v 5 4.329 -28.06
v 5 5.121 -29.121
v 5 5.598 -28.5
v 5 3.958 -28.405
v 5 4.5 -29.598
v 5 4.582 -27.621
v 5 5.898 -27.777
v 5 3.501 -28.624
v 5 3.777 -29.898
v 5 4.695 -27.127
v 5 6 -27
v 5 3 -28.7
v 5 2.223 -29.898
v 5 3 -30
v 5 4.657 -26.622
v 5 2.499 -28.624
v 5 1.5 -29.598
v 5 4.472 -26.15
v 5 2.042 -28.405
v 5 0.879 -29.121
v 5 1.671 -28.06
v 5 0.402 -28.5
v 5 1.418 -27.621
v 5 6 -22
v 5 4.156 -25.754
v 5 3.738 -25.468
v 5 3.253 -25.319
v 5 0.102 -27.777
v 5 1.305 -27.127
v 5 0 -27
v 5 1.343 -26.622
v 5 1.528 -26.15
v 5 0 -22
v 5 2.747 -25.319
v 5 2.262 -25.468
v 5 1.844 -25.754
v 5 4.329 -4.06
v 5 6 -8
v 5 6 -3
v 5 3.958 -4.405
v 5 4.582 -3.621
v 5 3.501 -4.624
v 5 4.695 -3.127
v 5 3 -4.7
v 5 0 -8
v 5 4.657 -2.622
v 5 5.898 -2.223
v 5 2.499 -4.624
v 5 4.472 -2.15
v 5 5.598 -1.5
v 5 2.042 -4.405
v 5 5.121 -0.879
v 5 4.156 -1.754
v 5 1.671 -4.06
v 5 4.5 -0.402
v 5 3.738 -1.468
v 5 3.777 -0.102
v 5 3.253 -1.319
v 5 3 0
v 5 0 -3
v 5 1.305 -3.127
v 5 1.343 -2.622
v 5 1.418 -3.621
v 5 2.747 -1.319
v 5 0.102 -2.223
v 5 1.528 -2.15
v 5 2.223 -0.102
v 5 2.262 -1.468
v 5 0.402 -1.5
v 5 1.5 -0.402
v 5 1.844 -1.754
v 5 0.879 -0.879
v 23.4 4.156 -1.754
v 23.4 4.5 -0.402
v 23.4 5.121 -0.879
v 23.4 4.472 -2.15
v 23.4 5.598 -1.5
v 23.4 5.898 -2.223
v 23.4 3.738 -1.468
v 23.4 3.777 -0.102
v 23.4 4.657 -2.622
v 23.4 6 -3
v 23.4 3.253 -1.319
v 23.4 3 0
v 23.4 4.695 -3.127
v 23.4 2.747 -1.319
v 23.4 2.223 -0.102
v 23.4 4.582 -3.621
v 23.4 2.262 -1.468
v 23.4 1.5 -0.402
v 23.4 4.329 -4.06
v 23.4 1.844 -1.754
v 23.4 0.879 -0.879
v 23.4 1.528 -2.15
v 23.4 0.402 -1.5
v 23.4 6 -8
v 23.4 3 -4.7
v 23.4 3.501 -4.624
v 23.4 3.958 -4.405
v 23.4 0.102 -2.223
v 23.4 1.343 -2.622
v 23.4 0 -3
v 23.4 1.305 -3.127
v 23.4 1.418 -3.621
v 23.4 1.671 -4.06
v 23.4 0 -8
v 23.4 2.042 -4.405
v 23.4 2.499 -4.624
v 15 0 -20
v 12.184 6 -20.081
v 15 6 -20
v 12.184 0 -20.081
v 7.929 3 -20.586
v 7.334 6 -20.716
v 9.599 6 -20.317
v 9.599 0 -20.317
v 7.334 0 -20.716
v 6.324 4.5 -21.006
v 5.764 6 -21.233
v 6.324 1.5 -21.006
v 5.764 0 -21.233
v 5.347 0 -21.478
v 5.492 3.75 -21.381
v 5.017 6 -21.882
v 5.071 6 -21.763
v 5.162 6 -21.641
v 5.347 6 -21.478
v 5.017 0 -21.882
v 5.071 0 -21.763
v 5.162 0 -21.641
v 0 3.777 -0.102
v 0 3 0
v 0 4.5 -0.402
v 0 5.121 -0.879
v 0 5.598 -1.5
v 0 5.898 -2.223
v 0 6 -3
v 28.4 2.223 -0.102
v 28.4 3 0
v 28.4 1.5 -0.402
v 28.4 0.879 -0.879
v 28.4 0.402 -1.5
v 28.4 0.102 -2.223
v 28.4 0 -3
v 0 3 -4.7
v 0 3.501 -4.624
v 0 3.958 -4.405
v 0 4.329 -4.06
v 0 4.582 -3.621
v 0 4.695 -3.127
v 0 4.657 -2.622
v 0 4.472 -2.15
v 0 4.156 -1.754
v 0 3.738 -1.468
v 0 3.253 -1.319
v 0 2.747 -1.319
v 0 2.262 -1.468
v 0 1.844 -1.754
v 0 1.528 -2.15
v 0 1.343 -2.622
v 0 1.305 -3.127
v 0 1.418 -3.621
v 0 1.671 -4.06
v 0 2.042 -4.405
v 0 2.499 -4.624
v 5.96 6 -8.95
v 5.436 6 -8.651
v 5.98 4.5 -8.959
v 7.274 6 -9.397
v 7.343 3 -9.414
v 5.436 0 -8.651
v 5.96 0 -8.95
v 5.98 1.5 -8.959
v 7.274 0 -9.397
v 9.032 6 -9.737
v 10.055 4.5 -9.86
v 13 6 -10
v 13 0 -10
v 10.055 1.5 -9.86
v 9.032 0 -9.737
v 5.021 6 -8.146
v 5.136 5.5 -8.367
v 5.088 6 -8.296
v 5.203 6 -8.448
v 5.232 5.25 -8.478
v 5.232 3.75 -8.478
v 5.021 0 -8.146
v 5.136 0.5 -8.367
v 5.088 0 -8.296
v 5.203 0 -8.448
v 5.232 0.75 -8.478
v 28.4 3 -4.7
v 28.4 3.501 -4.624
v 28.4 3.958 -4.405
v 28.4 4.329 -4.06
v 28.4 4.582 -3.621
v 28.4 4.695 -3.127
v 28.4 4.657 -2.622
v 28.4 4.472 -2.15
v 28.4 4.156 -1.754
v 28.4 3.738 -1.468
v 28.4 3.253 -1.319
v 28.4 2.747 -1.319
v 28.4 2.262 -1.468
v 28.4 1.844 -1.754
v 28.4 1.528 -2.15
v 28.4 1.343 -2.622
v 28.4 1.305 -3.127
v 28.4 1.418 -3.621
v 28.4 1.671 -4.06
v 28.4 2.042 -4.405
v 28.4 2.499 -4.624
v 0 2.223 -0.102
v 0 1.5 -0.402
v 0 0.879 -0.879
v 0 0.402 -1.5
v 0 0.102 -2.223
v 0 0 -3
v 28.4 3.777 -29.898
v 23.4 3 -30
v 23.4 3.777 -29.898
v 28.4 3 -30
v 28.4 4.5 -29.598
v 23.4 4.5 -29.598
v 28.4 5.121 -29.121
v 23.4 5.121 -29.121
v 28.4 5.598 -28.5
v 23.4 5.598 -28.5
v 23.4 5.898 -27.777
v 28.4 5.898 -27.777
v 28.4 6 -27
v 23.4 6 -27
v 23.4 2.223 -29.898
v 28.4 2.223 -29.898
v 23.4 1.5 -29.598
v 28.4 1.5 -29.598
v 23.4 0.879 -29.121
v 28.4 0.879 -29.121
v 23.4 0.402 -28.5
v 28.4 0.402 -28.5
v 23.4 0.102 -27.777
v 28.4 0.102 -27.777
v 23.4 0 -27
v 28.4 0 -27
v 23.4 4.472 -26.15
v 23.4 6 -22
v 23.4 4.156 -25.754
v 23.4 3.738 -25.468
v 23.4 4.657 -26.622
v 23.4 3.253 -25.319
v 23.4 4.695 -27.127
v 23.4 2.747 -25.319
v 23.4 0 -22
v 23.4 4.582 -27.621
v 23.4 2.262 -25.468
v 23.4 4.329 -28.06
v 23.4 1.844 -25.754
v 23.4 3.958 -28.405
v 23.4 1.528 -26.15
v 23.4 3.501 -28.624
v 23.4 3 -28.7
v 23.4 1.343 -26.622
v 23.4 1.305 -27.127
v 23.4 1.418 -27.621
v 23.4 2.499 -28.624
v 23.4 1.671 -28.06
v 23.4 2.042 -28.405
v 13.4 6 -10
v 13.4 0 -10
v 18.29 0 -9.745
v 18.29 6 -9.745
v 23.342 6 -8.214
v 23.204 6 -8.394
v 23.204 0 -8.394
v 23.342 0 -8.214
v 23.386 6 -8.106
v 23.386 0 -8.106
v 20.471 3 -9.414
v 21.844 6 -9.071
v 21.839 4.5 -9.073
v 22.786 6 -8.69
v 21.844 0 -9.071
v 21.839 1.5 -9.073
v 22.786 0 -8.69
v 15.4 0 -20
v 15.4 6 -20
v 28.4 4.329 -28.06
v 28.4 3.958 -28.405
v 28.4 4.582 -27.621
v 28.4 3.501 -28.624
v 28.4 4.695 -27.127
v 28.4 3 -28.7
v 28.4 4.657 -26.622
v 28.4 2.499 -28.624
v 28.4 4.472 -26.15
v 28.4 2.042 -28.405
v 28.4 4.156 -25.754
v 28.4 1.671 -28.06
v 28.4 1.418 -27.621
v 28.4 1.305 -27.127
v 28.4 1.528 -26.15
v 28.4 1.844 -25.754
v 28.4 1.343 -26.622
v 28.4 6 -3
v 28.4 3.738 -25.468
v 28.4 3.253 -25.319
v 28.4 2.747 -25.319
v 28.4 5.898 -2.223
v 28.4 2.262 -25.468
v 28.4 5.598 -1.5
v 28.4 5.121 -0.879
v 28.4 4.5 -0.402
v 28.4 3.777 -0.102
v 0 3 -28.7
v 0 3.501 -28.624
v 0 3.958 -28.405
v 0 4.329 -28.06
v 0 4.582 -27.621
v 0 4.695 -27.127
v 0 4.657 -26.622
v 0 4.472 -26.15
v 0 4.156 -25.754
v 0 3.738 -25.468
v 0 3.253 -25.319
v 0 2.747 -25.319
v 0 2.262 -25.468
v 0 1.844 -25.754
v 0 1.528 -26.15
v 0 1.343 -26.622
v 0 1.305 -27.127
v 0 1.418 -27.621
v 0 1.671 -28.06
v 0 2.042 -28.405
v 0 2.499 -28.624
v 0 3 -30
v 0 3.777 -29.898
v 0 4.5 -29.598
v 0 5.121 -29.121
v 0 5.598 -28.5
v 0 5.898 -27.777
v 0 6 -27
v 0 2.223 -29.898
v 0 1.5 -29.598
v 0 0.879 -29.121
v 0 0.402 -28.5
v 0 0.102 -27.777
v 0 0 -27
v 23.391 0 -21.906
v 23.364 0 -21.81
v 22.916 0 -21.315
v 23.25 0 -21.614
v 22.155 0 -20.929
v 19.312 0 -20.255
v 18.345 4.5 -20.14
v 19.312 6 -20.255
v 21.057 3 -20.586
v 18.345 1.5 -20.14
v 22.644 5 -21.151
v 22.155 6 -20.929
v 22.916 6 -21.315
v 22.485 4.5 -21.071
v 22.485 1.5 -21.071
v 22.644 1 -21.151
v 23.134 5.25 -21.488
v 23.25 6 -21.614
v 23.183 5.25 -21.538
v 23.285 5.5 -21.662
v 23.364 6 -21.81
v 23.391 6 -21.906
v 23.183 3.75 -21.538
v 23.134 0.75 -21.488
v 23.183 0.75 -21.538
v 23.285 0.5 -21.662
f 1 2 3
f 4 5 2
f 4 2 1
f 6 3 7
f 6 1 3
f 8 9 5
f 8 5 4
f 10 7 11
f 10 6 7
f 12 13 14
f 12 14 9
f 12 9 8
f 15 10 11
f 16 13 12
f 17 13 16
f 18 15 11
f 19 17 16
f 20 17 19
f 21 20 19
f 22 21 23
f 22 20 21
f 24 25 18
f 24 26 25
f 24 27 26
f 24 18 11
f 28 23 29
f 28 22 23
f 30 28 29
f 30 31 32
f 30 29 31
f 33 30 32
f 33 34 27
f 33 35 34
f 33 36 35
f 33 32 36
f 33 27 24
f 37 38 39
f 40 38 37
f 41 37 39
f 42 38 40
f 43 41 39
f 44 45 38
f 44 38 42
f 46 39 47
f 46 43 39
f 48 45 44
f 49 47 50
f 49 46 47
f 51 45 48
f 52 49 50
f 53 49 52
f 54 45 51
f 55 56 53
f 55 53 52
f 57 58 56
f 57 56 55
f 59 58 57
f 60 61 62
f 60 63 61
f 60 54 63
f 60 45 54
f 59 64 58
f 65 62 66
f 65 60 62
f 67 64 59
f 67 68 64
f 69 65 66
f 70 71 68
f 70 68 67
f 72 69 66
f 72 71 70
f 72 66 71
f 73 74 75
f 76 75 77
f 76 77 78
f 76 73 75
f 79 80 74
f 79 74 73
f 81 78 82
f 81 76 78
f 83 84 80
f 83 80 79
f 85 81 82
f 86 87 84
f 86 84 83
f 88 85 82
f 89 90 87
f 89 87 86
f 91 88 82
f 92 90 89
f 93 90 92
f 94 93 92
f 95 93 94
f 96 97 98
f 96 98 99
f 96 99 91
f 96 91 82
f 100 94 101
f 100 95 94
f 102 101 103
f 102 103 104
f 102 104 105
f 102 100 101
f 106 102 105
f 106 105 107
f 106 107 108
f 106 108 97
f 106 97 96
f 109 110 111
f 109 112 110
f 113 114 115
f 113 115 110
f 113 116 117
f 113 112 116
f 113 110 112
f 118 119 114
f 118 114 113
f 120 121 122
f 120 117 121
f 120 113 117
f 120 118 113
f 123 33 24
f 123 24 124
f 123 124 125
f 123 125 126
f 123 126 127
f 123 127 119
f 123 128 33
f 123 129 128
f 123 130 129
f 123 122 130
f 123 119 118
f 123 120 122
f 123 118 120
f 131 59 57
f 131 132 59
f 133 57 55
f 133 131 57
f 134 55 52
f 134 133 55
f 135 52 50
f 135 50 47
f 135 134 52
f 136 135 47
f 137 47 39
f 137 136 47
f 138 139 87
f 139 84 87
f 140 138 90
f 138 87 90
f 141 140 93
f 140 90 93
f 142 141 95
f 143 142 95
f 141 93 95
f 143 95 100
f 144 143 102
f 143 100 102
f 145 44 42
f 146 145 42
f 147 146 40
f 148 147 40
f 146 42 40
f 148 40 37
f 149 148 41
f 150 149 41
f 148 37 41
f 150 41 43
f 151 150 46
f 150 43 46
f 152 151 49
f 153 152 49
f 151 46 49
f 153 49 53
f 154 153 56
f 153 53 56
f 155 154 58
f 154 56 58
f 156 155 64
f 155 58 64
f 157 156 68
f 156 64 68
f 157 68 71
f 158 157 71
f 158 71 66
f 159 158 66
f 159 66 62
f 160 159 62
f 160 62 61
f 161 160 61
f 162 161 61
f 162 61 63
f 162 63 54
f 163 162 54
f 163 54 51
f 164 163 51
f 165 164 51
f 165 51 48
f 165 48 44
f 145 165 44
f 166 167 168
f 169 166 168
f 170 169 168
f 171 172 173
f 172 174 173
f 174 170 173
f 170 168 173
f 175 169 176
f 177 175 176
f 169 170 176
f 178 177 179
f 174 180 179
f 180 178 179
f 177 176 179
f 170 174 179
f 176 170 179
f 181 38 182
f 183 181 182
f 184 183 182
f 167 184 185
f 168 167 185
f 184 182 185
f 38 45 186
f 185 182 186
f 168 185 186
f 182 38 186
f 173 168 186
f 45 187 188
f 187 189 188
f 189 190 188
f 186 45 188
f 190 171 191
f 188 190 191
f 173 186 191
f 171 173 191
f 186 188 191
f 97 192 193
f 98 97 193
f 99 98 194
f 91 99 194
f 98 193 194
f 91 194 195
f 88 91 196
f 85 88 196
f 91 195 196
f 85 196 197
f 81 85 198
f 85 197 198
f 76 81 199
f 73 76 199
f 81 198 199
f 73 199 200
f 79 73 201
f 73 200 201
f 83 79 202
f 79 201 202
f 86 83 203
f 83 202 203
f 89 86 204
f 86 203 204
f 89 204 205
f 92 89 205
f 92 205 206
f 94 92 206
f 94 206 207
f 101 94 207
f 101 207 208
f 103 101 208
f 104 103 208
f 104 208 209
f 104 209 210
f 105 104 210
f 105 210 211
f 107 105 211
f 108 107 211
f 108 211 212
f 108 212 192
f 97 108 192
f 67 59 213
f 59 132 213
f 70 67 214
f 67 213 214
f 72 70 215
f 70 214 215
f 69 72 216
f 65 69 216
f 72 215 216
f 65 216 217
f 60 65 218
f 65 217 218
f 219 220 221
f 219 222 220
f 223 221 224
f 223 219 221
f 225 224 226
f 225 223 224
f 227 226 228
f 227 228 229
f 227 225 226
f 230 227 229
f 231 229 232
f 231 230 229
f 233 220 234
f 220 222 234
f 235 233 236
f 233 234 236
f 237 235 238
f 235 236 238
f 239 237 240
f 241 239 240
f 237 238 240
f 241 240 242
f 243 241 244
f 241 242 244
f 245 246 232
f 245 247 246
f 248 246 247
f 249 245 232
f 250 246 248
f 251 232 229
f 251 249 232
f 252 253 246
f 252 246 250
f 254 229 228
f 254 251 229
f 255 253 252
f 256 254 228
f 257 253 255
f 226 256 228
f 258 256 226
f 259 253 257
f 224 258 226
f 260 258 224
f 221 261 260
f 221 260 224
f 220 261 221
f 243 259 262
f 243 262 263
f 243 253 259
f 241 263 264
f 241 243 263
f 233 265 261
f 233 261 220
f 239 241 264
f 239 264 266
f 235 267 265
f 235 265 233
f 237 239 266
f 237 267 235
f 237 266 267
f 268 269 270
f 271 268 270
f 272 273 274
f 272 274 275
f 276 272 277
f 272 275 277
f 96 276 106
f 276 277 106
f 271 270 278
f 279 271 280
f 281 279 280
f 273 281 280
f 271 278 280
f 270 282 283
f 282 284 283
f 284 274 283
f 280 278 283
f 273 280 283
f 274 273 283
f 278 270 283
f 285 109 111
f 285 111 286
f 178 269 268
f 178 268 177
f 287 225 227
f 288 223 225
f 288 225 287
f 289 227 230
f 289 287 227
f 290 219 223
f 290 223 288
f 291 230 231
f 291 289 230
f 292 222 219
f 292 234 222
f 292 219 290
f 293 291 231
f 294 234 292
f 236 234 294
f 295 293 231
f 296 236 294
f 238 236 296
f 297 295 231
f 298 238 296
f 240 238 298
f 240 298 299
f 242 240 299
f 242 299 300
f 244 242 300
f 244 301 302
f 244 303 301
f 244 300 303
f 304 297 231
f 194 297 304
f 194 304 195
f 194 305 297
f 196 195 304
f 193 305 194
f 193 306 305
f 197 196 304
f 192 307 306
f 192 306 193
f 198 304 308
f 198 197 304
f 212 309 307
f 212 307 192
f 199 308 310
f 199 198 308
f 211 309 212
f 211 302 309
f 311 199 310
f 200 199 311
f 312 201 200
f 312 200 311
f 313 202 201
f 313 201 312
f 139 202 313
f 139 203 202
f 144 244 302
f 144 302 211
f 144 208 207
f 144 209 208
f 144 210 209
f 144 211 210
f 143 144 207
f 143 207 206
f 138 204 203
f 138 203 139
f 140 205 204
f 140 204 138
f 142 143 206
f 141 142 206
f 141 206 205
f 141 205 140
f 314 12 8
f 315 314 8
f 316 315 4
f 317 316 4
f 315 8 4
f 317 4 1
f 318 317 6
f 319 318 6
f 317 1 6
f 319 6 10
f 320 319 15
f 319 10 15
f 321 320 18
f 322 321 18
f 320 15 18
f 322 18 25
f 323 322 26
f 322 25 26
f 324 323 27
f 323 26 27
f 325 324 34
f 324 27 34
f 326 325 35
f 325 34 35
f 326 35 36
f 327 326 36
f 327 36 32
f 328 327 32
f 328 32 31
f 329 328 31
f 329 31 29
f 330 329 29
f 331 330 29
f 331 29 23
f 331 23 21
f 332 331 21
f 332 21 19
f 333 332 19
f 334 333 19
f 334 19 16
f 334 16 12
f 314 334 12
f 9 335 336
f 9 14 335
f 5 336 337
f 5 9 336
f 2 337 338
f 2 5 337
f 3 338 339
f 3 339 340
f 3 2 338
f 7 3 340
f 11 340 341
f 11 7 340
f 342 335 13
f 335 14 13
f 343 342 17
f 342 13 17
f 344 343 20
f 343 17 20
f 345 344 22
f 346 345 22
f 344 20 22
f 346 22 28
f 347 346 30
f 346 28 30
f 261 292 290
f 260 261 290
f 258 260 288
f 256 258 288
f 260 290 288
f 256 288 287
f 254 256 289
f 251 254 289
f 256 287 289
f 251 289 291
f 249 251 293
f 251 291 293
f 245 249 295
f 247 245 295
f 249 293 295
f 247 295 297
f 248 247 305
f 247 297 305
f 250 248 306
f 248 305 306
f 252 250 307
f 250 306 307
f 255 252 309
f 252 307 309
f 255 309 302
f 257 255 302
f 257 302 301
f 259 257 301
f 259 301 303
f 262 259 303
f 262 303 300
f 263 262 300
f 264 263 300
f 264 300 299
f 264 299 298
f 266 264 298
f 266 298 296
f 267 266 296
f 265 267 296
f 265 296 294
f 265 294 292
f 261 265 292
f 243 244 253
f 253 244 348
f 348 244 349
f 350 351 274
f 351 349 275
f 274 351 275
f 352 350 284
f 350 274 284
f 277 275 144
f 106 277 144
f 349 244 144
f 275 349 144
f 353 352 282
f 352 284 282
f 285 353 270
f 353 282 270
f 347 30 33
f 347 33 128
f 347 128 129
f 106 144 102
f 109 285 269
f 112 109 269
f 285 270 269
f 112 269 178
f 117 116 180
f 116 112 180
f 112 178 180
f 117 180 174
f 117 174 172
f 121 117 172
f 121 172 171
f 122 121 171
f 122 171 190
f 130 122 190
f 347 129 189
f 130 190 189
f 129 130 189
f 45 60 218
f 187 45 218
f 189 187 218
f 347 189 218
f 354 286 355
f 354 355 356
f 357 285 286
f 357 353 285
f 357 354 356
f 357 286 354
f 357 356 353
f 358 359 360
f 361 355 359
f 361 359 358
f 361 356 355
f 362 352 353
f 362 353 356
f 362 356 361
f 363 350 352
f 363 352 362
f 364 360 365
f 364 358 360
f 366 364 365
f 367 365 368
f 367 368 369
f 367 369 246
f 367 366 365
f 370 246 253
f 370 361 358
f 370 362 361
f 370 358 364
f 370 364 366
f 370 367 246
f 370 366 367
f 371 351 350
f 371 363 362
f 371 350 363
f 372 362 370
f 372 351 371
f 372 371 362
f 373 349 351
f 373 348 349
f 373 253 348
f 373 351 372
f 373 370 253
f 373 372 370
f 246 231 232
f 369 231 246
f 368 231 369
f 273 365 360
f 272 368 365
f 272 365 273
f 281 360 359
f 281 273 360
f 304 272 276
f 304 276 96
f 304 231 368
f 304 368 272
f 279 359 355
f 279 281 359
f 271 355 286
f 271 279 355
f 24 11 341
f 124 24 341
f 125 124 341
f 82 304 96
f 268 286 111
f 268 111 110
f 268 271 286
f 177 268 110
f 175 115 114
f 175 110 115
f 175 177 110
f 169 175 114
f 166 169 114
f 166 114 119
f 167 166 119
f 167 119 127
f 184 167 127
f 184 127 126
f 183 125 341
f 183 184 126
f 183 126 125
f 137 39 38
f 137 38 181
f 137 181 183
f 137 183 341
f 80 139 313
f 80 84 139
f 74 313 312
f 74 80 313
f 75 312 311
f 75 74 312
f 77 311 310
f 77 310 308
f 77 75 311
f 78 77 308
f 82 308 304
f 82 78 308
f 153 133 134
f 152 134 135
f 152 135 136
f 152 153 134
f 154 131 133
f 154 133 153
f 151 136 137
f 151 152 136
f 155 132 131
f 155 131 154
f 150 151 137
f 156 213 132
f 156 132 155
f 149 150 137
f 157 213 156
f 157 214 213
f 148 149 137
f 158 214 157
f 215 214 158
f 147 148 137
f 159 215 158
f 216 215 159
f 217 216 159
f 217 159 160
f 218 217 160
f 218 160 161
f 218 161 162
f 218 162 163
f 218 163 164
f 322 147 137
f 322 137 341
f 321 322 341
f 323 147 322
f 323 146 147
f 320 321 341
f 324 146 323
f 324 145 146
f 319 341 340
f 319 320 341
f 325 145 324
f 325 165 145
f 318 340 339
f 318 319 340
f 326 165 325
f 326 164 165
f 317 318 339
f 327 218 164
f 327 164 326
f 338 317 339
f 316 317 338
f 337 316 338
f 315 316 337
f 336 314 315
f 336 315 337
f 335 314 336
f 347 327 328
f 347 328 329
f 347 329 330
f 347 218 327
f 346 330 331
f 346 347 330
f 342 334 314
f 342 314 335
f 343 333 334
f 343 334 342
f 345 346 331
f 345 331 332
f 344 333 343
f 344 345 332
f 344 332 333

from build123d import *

# Parameters (mm, degrees)
BOSS_EXTRUDE1_DEPTH = 6
FILLET1_R           = 3
SKETCH2_R           = 1.7
CUT_EXTRUDE1_DEPTH  = 42.743981602
FILLET2_SIZE        = 8
FILLET2_SIZE_2      = 2
FILLET3_SIZE        = 2
FILLET3_SIZE_2      = 10


# Some blends are built 0.0001 mm under size
with BuildPart() as part:
    # Sketch1 → Boss-Extrude1 (new body)
    with BuildSketch(Plane(origin=(0, 0, 0), x_dir=(1, 0, 0), z_dir=(0, 1, 0))):
        Polygon((0, 0), (0, 30), (5, 30), (5, 20), (23.4, 20), (23.4, 30), (28.4, 30), (28.4, 0), (23.4, 0), (23.4, 10), (5, 10), (5, 0), align=None)
    extrude(amount=BOSS_EXTRUDE1_DEPTH)

    # Fillet1
    fillet1_edges = [part.edges().sort_by_distance(p)[0] for p in [
        (2.5, 0, -30),
        (2.5, 6, -30),
        (25.9, 0, -30),
        (25.9, 6, -30),
        (2.5, 0, 0),
        (2.5, 6, 0),
        (25.9, 0, 0),
        (25.9, 6, 0),
    ]]
    fillet(fillet1_edges, radius=FILLET1_R - 0.0001)  # a hair under: the kernel refuses the full size

    # Sketch2 → Cut-Extrude1 (cut, through all)
    with BuildSketch(Plane(origin=(28.4, 0, 0), x_dir=(0, 0, -1), z_dir=(1, 0, 0))):
        with Locations((3, 3)):
            Circle(SKETCH2_R)
        with Locations((27, 3)):
            Circle(SKETCH2_R)
    extrude(amount=-CUT_EXTRUDE1_DEPTH, mode=Mode.SUBTRACT)

    # Fillet2
    # an asymmetric fillet: 8, 2 mm, written as the material it adds along each edge
    with BuildSketch(Plane(origin=(23.4, 0, -20), x_dir=(-1, 0, 0), z_dir=(0, 1, 0))) as fillet2_piece_1:
        with BuildLine():
            Bezier((FILLET2_SIZE, 0), (0, 0), (0, -FILLET2_SIZE_2), weights=[1, 0.707106781, 1])
            Line((0, -FILLET2_SIZE_2), (0, 0))
            Line((0, 0), (FILLET2_SIZE, 0))
        make_face()
    extrude(amount=6)
    with BuildSketch(Plane(origin=(5, 0, -10), x_dir=(0, 0, 1), z_dir=(0, 1, 0))) as fillet2_piece_2:
        with BuildLine():
            Bezier((FILLET2_SIZE_2, 0), (0, 0), (0, FILLET2_SIZE), weights=[1, 0.707106781, 1])
            Line((0, FILLET2_SIZE), (0, 0))
            Line((0, 0), (FILLET2_SIZE_2, 0))
        make_face()
    extrude(amount=6)

    # Fillet3
    # an asymmetric fillet: 10, 2 mm, written as the material it adds along each edge
    with BuildSketch(Plane(origin=(5, 0, -20), x_dir=(0, 0, -1), z_dir=(0, 1, 0))) as fillet3_piece_1:
        with BuildLine():
            Bezier((FILLET3_SIZE, 0), (0, 0), (0, -FILLET3_SIZE_2), weights=[1, 0.707106781, 1])
            Line((0, -FILLET3_SIZE_2), (0, 0))
            Line((0, 0), (FILLET3_SIZE, 0))
        make_face()
    extrude(amount=6)
    with BuildSketch(Plane(origin=(23.4, 0, -10), x_dir=(-1, 0, 0), z_dir=(0, 1, 0))) as fillet3_piece_2:
        with BuildLine():
            Bezier((FILLET3_SIZE_2, 0), (0, 0), (0, FILLET3_SIZE), weights=[1, 0.707106781, 1])
            Line((0, FILLET3_SIZE), (0, 0))
            Line((0, 0), (FILLET3_SIZE_2, 0))
        make_face()
    extrude(amount=6)


solid = part.part
